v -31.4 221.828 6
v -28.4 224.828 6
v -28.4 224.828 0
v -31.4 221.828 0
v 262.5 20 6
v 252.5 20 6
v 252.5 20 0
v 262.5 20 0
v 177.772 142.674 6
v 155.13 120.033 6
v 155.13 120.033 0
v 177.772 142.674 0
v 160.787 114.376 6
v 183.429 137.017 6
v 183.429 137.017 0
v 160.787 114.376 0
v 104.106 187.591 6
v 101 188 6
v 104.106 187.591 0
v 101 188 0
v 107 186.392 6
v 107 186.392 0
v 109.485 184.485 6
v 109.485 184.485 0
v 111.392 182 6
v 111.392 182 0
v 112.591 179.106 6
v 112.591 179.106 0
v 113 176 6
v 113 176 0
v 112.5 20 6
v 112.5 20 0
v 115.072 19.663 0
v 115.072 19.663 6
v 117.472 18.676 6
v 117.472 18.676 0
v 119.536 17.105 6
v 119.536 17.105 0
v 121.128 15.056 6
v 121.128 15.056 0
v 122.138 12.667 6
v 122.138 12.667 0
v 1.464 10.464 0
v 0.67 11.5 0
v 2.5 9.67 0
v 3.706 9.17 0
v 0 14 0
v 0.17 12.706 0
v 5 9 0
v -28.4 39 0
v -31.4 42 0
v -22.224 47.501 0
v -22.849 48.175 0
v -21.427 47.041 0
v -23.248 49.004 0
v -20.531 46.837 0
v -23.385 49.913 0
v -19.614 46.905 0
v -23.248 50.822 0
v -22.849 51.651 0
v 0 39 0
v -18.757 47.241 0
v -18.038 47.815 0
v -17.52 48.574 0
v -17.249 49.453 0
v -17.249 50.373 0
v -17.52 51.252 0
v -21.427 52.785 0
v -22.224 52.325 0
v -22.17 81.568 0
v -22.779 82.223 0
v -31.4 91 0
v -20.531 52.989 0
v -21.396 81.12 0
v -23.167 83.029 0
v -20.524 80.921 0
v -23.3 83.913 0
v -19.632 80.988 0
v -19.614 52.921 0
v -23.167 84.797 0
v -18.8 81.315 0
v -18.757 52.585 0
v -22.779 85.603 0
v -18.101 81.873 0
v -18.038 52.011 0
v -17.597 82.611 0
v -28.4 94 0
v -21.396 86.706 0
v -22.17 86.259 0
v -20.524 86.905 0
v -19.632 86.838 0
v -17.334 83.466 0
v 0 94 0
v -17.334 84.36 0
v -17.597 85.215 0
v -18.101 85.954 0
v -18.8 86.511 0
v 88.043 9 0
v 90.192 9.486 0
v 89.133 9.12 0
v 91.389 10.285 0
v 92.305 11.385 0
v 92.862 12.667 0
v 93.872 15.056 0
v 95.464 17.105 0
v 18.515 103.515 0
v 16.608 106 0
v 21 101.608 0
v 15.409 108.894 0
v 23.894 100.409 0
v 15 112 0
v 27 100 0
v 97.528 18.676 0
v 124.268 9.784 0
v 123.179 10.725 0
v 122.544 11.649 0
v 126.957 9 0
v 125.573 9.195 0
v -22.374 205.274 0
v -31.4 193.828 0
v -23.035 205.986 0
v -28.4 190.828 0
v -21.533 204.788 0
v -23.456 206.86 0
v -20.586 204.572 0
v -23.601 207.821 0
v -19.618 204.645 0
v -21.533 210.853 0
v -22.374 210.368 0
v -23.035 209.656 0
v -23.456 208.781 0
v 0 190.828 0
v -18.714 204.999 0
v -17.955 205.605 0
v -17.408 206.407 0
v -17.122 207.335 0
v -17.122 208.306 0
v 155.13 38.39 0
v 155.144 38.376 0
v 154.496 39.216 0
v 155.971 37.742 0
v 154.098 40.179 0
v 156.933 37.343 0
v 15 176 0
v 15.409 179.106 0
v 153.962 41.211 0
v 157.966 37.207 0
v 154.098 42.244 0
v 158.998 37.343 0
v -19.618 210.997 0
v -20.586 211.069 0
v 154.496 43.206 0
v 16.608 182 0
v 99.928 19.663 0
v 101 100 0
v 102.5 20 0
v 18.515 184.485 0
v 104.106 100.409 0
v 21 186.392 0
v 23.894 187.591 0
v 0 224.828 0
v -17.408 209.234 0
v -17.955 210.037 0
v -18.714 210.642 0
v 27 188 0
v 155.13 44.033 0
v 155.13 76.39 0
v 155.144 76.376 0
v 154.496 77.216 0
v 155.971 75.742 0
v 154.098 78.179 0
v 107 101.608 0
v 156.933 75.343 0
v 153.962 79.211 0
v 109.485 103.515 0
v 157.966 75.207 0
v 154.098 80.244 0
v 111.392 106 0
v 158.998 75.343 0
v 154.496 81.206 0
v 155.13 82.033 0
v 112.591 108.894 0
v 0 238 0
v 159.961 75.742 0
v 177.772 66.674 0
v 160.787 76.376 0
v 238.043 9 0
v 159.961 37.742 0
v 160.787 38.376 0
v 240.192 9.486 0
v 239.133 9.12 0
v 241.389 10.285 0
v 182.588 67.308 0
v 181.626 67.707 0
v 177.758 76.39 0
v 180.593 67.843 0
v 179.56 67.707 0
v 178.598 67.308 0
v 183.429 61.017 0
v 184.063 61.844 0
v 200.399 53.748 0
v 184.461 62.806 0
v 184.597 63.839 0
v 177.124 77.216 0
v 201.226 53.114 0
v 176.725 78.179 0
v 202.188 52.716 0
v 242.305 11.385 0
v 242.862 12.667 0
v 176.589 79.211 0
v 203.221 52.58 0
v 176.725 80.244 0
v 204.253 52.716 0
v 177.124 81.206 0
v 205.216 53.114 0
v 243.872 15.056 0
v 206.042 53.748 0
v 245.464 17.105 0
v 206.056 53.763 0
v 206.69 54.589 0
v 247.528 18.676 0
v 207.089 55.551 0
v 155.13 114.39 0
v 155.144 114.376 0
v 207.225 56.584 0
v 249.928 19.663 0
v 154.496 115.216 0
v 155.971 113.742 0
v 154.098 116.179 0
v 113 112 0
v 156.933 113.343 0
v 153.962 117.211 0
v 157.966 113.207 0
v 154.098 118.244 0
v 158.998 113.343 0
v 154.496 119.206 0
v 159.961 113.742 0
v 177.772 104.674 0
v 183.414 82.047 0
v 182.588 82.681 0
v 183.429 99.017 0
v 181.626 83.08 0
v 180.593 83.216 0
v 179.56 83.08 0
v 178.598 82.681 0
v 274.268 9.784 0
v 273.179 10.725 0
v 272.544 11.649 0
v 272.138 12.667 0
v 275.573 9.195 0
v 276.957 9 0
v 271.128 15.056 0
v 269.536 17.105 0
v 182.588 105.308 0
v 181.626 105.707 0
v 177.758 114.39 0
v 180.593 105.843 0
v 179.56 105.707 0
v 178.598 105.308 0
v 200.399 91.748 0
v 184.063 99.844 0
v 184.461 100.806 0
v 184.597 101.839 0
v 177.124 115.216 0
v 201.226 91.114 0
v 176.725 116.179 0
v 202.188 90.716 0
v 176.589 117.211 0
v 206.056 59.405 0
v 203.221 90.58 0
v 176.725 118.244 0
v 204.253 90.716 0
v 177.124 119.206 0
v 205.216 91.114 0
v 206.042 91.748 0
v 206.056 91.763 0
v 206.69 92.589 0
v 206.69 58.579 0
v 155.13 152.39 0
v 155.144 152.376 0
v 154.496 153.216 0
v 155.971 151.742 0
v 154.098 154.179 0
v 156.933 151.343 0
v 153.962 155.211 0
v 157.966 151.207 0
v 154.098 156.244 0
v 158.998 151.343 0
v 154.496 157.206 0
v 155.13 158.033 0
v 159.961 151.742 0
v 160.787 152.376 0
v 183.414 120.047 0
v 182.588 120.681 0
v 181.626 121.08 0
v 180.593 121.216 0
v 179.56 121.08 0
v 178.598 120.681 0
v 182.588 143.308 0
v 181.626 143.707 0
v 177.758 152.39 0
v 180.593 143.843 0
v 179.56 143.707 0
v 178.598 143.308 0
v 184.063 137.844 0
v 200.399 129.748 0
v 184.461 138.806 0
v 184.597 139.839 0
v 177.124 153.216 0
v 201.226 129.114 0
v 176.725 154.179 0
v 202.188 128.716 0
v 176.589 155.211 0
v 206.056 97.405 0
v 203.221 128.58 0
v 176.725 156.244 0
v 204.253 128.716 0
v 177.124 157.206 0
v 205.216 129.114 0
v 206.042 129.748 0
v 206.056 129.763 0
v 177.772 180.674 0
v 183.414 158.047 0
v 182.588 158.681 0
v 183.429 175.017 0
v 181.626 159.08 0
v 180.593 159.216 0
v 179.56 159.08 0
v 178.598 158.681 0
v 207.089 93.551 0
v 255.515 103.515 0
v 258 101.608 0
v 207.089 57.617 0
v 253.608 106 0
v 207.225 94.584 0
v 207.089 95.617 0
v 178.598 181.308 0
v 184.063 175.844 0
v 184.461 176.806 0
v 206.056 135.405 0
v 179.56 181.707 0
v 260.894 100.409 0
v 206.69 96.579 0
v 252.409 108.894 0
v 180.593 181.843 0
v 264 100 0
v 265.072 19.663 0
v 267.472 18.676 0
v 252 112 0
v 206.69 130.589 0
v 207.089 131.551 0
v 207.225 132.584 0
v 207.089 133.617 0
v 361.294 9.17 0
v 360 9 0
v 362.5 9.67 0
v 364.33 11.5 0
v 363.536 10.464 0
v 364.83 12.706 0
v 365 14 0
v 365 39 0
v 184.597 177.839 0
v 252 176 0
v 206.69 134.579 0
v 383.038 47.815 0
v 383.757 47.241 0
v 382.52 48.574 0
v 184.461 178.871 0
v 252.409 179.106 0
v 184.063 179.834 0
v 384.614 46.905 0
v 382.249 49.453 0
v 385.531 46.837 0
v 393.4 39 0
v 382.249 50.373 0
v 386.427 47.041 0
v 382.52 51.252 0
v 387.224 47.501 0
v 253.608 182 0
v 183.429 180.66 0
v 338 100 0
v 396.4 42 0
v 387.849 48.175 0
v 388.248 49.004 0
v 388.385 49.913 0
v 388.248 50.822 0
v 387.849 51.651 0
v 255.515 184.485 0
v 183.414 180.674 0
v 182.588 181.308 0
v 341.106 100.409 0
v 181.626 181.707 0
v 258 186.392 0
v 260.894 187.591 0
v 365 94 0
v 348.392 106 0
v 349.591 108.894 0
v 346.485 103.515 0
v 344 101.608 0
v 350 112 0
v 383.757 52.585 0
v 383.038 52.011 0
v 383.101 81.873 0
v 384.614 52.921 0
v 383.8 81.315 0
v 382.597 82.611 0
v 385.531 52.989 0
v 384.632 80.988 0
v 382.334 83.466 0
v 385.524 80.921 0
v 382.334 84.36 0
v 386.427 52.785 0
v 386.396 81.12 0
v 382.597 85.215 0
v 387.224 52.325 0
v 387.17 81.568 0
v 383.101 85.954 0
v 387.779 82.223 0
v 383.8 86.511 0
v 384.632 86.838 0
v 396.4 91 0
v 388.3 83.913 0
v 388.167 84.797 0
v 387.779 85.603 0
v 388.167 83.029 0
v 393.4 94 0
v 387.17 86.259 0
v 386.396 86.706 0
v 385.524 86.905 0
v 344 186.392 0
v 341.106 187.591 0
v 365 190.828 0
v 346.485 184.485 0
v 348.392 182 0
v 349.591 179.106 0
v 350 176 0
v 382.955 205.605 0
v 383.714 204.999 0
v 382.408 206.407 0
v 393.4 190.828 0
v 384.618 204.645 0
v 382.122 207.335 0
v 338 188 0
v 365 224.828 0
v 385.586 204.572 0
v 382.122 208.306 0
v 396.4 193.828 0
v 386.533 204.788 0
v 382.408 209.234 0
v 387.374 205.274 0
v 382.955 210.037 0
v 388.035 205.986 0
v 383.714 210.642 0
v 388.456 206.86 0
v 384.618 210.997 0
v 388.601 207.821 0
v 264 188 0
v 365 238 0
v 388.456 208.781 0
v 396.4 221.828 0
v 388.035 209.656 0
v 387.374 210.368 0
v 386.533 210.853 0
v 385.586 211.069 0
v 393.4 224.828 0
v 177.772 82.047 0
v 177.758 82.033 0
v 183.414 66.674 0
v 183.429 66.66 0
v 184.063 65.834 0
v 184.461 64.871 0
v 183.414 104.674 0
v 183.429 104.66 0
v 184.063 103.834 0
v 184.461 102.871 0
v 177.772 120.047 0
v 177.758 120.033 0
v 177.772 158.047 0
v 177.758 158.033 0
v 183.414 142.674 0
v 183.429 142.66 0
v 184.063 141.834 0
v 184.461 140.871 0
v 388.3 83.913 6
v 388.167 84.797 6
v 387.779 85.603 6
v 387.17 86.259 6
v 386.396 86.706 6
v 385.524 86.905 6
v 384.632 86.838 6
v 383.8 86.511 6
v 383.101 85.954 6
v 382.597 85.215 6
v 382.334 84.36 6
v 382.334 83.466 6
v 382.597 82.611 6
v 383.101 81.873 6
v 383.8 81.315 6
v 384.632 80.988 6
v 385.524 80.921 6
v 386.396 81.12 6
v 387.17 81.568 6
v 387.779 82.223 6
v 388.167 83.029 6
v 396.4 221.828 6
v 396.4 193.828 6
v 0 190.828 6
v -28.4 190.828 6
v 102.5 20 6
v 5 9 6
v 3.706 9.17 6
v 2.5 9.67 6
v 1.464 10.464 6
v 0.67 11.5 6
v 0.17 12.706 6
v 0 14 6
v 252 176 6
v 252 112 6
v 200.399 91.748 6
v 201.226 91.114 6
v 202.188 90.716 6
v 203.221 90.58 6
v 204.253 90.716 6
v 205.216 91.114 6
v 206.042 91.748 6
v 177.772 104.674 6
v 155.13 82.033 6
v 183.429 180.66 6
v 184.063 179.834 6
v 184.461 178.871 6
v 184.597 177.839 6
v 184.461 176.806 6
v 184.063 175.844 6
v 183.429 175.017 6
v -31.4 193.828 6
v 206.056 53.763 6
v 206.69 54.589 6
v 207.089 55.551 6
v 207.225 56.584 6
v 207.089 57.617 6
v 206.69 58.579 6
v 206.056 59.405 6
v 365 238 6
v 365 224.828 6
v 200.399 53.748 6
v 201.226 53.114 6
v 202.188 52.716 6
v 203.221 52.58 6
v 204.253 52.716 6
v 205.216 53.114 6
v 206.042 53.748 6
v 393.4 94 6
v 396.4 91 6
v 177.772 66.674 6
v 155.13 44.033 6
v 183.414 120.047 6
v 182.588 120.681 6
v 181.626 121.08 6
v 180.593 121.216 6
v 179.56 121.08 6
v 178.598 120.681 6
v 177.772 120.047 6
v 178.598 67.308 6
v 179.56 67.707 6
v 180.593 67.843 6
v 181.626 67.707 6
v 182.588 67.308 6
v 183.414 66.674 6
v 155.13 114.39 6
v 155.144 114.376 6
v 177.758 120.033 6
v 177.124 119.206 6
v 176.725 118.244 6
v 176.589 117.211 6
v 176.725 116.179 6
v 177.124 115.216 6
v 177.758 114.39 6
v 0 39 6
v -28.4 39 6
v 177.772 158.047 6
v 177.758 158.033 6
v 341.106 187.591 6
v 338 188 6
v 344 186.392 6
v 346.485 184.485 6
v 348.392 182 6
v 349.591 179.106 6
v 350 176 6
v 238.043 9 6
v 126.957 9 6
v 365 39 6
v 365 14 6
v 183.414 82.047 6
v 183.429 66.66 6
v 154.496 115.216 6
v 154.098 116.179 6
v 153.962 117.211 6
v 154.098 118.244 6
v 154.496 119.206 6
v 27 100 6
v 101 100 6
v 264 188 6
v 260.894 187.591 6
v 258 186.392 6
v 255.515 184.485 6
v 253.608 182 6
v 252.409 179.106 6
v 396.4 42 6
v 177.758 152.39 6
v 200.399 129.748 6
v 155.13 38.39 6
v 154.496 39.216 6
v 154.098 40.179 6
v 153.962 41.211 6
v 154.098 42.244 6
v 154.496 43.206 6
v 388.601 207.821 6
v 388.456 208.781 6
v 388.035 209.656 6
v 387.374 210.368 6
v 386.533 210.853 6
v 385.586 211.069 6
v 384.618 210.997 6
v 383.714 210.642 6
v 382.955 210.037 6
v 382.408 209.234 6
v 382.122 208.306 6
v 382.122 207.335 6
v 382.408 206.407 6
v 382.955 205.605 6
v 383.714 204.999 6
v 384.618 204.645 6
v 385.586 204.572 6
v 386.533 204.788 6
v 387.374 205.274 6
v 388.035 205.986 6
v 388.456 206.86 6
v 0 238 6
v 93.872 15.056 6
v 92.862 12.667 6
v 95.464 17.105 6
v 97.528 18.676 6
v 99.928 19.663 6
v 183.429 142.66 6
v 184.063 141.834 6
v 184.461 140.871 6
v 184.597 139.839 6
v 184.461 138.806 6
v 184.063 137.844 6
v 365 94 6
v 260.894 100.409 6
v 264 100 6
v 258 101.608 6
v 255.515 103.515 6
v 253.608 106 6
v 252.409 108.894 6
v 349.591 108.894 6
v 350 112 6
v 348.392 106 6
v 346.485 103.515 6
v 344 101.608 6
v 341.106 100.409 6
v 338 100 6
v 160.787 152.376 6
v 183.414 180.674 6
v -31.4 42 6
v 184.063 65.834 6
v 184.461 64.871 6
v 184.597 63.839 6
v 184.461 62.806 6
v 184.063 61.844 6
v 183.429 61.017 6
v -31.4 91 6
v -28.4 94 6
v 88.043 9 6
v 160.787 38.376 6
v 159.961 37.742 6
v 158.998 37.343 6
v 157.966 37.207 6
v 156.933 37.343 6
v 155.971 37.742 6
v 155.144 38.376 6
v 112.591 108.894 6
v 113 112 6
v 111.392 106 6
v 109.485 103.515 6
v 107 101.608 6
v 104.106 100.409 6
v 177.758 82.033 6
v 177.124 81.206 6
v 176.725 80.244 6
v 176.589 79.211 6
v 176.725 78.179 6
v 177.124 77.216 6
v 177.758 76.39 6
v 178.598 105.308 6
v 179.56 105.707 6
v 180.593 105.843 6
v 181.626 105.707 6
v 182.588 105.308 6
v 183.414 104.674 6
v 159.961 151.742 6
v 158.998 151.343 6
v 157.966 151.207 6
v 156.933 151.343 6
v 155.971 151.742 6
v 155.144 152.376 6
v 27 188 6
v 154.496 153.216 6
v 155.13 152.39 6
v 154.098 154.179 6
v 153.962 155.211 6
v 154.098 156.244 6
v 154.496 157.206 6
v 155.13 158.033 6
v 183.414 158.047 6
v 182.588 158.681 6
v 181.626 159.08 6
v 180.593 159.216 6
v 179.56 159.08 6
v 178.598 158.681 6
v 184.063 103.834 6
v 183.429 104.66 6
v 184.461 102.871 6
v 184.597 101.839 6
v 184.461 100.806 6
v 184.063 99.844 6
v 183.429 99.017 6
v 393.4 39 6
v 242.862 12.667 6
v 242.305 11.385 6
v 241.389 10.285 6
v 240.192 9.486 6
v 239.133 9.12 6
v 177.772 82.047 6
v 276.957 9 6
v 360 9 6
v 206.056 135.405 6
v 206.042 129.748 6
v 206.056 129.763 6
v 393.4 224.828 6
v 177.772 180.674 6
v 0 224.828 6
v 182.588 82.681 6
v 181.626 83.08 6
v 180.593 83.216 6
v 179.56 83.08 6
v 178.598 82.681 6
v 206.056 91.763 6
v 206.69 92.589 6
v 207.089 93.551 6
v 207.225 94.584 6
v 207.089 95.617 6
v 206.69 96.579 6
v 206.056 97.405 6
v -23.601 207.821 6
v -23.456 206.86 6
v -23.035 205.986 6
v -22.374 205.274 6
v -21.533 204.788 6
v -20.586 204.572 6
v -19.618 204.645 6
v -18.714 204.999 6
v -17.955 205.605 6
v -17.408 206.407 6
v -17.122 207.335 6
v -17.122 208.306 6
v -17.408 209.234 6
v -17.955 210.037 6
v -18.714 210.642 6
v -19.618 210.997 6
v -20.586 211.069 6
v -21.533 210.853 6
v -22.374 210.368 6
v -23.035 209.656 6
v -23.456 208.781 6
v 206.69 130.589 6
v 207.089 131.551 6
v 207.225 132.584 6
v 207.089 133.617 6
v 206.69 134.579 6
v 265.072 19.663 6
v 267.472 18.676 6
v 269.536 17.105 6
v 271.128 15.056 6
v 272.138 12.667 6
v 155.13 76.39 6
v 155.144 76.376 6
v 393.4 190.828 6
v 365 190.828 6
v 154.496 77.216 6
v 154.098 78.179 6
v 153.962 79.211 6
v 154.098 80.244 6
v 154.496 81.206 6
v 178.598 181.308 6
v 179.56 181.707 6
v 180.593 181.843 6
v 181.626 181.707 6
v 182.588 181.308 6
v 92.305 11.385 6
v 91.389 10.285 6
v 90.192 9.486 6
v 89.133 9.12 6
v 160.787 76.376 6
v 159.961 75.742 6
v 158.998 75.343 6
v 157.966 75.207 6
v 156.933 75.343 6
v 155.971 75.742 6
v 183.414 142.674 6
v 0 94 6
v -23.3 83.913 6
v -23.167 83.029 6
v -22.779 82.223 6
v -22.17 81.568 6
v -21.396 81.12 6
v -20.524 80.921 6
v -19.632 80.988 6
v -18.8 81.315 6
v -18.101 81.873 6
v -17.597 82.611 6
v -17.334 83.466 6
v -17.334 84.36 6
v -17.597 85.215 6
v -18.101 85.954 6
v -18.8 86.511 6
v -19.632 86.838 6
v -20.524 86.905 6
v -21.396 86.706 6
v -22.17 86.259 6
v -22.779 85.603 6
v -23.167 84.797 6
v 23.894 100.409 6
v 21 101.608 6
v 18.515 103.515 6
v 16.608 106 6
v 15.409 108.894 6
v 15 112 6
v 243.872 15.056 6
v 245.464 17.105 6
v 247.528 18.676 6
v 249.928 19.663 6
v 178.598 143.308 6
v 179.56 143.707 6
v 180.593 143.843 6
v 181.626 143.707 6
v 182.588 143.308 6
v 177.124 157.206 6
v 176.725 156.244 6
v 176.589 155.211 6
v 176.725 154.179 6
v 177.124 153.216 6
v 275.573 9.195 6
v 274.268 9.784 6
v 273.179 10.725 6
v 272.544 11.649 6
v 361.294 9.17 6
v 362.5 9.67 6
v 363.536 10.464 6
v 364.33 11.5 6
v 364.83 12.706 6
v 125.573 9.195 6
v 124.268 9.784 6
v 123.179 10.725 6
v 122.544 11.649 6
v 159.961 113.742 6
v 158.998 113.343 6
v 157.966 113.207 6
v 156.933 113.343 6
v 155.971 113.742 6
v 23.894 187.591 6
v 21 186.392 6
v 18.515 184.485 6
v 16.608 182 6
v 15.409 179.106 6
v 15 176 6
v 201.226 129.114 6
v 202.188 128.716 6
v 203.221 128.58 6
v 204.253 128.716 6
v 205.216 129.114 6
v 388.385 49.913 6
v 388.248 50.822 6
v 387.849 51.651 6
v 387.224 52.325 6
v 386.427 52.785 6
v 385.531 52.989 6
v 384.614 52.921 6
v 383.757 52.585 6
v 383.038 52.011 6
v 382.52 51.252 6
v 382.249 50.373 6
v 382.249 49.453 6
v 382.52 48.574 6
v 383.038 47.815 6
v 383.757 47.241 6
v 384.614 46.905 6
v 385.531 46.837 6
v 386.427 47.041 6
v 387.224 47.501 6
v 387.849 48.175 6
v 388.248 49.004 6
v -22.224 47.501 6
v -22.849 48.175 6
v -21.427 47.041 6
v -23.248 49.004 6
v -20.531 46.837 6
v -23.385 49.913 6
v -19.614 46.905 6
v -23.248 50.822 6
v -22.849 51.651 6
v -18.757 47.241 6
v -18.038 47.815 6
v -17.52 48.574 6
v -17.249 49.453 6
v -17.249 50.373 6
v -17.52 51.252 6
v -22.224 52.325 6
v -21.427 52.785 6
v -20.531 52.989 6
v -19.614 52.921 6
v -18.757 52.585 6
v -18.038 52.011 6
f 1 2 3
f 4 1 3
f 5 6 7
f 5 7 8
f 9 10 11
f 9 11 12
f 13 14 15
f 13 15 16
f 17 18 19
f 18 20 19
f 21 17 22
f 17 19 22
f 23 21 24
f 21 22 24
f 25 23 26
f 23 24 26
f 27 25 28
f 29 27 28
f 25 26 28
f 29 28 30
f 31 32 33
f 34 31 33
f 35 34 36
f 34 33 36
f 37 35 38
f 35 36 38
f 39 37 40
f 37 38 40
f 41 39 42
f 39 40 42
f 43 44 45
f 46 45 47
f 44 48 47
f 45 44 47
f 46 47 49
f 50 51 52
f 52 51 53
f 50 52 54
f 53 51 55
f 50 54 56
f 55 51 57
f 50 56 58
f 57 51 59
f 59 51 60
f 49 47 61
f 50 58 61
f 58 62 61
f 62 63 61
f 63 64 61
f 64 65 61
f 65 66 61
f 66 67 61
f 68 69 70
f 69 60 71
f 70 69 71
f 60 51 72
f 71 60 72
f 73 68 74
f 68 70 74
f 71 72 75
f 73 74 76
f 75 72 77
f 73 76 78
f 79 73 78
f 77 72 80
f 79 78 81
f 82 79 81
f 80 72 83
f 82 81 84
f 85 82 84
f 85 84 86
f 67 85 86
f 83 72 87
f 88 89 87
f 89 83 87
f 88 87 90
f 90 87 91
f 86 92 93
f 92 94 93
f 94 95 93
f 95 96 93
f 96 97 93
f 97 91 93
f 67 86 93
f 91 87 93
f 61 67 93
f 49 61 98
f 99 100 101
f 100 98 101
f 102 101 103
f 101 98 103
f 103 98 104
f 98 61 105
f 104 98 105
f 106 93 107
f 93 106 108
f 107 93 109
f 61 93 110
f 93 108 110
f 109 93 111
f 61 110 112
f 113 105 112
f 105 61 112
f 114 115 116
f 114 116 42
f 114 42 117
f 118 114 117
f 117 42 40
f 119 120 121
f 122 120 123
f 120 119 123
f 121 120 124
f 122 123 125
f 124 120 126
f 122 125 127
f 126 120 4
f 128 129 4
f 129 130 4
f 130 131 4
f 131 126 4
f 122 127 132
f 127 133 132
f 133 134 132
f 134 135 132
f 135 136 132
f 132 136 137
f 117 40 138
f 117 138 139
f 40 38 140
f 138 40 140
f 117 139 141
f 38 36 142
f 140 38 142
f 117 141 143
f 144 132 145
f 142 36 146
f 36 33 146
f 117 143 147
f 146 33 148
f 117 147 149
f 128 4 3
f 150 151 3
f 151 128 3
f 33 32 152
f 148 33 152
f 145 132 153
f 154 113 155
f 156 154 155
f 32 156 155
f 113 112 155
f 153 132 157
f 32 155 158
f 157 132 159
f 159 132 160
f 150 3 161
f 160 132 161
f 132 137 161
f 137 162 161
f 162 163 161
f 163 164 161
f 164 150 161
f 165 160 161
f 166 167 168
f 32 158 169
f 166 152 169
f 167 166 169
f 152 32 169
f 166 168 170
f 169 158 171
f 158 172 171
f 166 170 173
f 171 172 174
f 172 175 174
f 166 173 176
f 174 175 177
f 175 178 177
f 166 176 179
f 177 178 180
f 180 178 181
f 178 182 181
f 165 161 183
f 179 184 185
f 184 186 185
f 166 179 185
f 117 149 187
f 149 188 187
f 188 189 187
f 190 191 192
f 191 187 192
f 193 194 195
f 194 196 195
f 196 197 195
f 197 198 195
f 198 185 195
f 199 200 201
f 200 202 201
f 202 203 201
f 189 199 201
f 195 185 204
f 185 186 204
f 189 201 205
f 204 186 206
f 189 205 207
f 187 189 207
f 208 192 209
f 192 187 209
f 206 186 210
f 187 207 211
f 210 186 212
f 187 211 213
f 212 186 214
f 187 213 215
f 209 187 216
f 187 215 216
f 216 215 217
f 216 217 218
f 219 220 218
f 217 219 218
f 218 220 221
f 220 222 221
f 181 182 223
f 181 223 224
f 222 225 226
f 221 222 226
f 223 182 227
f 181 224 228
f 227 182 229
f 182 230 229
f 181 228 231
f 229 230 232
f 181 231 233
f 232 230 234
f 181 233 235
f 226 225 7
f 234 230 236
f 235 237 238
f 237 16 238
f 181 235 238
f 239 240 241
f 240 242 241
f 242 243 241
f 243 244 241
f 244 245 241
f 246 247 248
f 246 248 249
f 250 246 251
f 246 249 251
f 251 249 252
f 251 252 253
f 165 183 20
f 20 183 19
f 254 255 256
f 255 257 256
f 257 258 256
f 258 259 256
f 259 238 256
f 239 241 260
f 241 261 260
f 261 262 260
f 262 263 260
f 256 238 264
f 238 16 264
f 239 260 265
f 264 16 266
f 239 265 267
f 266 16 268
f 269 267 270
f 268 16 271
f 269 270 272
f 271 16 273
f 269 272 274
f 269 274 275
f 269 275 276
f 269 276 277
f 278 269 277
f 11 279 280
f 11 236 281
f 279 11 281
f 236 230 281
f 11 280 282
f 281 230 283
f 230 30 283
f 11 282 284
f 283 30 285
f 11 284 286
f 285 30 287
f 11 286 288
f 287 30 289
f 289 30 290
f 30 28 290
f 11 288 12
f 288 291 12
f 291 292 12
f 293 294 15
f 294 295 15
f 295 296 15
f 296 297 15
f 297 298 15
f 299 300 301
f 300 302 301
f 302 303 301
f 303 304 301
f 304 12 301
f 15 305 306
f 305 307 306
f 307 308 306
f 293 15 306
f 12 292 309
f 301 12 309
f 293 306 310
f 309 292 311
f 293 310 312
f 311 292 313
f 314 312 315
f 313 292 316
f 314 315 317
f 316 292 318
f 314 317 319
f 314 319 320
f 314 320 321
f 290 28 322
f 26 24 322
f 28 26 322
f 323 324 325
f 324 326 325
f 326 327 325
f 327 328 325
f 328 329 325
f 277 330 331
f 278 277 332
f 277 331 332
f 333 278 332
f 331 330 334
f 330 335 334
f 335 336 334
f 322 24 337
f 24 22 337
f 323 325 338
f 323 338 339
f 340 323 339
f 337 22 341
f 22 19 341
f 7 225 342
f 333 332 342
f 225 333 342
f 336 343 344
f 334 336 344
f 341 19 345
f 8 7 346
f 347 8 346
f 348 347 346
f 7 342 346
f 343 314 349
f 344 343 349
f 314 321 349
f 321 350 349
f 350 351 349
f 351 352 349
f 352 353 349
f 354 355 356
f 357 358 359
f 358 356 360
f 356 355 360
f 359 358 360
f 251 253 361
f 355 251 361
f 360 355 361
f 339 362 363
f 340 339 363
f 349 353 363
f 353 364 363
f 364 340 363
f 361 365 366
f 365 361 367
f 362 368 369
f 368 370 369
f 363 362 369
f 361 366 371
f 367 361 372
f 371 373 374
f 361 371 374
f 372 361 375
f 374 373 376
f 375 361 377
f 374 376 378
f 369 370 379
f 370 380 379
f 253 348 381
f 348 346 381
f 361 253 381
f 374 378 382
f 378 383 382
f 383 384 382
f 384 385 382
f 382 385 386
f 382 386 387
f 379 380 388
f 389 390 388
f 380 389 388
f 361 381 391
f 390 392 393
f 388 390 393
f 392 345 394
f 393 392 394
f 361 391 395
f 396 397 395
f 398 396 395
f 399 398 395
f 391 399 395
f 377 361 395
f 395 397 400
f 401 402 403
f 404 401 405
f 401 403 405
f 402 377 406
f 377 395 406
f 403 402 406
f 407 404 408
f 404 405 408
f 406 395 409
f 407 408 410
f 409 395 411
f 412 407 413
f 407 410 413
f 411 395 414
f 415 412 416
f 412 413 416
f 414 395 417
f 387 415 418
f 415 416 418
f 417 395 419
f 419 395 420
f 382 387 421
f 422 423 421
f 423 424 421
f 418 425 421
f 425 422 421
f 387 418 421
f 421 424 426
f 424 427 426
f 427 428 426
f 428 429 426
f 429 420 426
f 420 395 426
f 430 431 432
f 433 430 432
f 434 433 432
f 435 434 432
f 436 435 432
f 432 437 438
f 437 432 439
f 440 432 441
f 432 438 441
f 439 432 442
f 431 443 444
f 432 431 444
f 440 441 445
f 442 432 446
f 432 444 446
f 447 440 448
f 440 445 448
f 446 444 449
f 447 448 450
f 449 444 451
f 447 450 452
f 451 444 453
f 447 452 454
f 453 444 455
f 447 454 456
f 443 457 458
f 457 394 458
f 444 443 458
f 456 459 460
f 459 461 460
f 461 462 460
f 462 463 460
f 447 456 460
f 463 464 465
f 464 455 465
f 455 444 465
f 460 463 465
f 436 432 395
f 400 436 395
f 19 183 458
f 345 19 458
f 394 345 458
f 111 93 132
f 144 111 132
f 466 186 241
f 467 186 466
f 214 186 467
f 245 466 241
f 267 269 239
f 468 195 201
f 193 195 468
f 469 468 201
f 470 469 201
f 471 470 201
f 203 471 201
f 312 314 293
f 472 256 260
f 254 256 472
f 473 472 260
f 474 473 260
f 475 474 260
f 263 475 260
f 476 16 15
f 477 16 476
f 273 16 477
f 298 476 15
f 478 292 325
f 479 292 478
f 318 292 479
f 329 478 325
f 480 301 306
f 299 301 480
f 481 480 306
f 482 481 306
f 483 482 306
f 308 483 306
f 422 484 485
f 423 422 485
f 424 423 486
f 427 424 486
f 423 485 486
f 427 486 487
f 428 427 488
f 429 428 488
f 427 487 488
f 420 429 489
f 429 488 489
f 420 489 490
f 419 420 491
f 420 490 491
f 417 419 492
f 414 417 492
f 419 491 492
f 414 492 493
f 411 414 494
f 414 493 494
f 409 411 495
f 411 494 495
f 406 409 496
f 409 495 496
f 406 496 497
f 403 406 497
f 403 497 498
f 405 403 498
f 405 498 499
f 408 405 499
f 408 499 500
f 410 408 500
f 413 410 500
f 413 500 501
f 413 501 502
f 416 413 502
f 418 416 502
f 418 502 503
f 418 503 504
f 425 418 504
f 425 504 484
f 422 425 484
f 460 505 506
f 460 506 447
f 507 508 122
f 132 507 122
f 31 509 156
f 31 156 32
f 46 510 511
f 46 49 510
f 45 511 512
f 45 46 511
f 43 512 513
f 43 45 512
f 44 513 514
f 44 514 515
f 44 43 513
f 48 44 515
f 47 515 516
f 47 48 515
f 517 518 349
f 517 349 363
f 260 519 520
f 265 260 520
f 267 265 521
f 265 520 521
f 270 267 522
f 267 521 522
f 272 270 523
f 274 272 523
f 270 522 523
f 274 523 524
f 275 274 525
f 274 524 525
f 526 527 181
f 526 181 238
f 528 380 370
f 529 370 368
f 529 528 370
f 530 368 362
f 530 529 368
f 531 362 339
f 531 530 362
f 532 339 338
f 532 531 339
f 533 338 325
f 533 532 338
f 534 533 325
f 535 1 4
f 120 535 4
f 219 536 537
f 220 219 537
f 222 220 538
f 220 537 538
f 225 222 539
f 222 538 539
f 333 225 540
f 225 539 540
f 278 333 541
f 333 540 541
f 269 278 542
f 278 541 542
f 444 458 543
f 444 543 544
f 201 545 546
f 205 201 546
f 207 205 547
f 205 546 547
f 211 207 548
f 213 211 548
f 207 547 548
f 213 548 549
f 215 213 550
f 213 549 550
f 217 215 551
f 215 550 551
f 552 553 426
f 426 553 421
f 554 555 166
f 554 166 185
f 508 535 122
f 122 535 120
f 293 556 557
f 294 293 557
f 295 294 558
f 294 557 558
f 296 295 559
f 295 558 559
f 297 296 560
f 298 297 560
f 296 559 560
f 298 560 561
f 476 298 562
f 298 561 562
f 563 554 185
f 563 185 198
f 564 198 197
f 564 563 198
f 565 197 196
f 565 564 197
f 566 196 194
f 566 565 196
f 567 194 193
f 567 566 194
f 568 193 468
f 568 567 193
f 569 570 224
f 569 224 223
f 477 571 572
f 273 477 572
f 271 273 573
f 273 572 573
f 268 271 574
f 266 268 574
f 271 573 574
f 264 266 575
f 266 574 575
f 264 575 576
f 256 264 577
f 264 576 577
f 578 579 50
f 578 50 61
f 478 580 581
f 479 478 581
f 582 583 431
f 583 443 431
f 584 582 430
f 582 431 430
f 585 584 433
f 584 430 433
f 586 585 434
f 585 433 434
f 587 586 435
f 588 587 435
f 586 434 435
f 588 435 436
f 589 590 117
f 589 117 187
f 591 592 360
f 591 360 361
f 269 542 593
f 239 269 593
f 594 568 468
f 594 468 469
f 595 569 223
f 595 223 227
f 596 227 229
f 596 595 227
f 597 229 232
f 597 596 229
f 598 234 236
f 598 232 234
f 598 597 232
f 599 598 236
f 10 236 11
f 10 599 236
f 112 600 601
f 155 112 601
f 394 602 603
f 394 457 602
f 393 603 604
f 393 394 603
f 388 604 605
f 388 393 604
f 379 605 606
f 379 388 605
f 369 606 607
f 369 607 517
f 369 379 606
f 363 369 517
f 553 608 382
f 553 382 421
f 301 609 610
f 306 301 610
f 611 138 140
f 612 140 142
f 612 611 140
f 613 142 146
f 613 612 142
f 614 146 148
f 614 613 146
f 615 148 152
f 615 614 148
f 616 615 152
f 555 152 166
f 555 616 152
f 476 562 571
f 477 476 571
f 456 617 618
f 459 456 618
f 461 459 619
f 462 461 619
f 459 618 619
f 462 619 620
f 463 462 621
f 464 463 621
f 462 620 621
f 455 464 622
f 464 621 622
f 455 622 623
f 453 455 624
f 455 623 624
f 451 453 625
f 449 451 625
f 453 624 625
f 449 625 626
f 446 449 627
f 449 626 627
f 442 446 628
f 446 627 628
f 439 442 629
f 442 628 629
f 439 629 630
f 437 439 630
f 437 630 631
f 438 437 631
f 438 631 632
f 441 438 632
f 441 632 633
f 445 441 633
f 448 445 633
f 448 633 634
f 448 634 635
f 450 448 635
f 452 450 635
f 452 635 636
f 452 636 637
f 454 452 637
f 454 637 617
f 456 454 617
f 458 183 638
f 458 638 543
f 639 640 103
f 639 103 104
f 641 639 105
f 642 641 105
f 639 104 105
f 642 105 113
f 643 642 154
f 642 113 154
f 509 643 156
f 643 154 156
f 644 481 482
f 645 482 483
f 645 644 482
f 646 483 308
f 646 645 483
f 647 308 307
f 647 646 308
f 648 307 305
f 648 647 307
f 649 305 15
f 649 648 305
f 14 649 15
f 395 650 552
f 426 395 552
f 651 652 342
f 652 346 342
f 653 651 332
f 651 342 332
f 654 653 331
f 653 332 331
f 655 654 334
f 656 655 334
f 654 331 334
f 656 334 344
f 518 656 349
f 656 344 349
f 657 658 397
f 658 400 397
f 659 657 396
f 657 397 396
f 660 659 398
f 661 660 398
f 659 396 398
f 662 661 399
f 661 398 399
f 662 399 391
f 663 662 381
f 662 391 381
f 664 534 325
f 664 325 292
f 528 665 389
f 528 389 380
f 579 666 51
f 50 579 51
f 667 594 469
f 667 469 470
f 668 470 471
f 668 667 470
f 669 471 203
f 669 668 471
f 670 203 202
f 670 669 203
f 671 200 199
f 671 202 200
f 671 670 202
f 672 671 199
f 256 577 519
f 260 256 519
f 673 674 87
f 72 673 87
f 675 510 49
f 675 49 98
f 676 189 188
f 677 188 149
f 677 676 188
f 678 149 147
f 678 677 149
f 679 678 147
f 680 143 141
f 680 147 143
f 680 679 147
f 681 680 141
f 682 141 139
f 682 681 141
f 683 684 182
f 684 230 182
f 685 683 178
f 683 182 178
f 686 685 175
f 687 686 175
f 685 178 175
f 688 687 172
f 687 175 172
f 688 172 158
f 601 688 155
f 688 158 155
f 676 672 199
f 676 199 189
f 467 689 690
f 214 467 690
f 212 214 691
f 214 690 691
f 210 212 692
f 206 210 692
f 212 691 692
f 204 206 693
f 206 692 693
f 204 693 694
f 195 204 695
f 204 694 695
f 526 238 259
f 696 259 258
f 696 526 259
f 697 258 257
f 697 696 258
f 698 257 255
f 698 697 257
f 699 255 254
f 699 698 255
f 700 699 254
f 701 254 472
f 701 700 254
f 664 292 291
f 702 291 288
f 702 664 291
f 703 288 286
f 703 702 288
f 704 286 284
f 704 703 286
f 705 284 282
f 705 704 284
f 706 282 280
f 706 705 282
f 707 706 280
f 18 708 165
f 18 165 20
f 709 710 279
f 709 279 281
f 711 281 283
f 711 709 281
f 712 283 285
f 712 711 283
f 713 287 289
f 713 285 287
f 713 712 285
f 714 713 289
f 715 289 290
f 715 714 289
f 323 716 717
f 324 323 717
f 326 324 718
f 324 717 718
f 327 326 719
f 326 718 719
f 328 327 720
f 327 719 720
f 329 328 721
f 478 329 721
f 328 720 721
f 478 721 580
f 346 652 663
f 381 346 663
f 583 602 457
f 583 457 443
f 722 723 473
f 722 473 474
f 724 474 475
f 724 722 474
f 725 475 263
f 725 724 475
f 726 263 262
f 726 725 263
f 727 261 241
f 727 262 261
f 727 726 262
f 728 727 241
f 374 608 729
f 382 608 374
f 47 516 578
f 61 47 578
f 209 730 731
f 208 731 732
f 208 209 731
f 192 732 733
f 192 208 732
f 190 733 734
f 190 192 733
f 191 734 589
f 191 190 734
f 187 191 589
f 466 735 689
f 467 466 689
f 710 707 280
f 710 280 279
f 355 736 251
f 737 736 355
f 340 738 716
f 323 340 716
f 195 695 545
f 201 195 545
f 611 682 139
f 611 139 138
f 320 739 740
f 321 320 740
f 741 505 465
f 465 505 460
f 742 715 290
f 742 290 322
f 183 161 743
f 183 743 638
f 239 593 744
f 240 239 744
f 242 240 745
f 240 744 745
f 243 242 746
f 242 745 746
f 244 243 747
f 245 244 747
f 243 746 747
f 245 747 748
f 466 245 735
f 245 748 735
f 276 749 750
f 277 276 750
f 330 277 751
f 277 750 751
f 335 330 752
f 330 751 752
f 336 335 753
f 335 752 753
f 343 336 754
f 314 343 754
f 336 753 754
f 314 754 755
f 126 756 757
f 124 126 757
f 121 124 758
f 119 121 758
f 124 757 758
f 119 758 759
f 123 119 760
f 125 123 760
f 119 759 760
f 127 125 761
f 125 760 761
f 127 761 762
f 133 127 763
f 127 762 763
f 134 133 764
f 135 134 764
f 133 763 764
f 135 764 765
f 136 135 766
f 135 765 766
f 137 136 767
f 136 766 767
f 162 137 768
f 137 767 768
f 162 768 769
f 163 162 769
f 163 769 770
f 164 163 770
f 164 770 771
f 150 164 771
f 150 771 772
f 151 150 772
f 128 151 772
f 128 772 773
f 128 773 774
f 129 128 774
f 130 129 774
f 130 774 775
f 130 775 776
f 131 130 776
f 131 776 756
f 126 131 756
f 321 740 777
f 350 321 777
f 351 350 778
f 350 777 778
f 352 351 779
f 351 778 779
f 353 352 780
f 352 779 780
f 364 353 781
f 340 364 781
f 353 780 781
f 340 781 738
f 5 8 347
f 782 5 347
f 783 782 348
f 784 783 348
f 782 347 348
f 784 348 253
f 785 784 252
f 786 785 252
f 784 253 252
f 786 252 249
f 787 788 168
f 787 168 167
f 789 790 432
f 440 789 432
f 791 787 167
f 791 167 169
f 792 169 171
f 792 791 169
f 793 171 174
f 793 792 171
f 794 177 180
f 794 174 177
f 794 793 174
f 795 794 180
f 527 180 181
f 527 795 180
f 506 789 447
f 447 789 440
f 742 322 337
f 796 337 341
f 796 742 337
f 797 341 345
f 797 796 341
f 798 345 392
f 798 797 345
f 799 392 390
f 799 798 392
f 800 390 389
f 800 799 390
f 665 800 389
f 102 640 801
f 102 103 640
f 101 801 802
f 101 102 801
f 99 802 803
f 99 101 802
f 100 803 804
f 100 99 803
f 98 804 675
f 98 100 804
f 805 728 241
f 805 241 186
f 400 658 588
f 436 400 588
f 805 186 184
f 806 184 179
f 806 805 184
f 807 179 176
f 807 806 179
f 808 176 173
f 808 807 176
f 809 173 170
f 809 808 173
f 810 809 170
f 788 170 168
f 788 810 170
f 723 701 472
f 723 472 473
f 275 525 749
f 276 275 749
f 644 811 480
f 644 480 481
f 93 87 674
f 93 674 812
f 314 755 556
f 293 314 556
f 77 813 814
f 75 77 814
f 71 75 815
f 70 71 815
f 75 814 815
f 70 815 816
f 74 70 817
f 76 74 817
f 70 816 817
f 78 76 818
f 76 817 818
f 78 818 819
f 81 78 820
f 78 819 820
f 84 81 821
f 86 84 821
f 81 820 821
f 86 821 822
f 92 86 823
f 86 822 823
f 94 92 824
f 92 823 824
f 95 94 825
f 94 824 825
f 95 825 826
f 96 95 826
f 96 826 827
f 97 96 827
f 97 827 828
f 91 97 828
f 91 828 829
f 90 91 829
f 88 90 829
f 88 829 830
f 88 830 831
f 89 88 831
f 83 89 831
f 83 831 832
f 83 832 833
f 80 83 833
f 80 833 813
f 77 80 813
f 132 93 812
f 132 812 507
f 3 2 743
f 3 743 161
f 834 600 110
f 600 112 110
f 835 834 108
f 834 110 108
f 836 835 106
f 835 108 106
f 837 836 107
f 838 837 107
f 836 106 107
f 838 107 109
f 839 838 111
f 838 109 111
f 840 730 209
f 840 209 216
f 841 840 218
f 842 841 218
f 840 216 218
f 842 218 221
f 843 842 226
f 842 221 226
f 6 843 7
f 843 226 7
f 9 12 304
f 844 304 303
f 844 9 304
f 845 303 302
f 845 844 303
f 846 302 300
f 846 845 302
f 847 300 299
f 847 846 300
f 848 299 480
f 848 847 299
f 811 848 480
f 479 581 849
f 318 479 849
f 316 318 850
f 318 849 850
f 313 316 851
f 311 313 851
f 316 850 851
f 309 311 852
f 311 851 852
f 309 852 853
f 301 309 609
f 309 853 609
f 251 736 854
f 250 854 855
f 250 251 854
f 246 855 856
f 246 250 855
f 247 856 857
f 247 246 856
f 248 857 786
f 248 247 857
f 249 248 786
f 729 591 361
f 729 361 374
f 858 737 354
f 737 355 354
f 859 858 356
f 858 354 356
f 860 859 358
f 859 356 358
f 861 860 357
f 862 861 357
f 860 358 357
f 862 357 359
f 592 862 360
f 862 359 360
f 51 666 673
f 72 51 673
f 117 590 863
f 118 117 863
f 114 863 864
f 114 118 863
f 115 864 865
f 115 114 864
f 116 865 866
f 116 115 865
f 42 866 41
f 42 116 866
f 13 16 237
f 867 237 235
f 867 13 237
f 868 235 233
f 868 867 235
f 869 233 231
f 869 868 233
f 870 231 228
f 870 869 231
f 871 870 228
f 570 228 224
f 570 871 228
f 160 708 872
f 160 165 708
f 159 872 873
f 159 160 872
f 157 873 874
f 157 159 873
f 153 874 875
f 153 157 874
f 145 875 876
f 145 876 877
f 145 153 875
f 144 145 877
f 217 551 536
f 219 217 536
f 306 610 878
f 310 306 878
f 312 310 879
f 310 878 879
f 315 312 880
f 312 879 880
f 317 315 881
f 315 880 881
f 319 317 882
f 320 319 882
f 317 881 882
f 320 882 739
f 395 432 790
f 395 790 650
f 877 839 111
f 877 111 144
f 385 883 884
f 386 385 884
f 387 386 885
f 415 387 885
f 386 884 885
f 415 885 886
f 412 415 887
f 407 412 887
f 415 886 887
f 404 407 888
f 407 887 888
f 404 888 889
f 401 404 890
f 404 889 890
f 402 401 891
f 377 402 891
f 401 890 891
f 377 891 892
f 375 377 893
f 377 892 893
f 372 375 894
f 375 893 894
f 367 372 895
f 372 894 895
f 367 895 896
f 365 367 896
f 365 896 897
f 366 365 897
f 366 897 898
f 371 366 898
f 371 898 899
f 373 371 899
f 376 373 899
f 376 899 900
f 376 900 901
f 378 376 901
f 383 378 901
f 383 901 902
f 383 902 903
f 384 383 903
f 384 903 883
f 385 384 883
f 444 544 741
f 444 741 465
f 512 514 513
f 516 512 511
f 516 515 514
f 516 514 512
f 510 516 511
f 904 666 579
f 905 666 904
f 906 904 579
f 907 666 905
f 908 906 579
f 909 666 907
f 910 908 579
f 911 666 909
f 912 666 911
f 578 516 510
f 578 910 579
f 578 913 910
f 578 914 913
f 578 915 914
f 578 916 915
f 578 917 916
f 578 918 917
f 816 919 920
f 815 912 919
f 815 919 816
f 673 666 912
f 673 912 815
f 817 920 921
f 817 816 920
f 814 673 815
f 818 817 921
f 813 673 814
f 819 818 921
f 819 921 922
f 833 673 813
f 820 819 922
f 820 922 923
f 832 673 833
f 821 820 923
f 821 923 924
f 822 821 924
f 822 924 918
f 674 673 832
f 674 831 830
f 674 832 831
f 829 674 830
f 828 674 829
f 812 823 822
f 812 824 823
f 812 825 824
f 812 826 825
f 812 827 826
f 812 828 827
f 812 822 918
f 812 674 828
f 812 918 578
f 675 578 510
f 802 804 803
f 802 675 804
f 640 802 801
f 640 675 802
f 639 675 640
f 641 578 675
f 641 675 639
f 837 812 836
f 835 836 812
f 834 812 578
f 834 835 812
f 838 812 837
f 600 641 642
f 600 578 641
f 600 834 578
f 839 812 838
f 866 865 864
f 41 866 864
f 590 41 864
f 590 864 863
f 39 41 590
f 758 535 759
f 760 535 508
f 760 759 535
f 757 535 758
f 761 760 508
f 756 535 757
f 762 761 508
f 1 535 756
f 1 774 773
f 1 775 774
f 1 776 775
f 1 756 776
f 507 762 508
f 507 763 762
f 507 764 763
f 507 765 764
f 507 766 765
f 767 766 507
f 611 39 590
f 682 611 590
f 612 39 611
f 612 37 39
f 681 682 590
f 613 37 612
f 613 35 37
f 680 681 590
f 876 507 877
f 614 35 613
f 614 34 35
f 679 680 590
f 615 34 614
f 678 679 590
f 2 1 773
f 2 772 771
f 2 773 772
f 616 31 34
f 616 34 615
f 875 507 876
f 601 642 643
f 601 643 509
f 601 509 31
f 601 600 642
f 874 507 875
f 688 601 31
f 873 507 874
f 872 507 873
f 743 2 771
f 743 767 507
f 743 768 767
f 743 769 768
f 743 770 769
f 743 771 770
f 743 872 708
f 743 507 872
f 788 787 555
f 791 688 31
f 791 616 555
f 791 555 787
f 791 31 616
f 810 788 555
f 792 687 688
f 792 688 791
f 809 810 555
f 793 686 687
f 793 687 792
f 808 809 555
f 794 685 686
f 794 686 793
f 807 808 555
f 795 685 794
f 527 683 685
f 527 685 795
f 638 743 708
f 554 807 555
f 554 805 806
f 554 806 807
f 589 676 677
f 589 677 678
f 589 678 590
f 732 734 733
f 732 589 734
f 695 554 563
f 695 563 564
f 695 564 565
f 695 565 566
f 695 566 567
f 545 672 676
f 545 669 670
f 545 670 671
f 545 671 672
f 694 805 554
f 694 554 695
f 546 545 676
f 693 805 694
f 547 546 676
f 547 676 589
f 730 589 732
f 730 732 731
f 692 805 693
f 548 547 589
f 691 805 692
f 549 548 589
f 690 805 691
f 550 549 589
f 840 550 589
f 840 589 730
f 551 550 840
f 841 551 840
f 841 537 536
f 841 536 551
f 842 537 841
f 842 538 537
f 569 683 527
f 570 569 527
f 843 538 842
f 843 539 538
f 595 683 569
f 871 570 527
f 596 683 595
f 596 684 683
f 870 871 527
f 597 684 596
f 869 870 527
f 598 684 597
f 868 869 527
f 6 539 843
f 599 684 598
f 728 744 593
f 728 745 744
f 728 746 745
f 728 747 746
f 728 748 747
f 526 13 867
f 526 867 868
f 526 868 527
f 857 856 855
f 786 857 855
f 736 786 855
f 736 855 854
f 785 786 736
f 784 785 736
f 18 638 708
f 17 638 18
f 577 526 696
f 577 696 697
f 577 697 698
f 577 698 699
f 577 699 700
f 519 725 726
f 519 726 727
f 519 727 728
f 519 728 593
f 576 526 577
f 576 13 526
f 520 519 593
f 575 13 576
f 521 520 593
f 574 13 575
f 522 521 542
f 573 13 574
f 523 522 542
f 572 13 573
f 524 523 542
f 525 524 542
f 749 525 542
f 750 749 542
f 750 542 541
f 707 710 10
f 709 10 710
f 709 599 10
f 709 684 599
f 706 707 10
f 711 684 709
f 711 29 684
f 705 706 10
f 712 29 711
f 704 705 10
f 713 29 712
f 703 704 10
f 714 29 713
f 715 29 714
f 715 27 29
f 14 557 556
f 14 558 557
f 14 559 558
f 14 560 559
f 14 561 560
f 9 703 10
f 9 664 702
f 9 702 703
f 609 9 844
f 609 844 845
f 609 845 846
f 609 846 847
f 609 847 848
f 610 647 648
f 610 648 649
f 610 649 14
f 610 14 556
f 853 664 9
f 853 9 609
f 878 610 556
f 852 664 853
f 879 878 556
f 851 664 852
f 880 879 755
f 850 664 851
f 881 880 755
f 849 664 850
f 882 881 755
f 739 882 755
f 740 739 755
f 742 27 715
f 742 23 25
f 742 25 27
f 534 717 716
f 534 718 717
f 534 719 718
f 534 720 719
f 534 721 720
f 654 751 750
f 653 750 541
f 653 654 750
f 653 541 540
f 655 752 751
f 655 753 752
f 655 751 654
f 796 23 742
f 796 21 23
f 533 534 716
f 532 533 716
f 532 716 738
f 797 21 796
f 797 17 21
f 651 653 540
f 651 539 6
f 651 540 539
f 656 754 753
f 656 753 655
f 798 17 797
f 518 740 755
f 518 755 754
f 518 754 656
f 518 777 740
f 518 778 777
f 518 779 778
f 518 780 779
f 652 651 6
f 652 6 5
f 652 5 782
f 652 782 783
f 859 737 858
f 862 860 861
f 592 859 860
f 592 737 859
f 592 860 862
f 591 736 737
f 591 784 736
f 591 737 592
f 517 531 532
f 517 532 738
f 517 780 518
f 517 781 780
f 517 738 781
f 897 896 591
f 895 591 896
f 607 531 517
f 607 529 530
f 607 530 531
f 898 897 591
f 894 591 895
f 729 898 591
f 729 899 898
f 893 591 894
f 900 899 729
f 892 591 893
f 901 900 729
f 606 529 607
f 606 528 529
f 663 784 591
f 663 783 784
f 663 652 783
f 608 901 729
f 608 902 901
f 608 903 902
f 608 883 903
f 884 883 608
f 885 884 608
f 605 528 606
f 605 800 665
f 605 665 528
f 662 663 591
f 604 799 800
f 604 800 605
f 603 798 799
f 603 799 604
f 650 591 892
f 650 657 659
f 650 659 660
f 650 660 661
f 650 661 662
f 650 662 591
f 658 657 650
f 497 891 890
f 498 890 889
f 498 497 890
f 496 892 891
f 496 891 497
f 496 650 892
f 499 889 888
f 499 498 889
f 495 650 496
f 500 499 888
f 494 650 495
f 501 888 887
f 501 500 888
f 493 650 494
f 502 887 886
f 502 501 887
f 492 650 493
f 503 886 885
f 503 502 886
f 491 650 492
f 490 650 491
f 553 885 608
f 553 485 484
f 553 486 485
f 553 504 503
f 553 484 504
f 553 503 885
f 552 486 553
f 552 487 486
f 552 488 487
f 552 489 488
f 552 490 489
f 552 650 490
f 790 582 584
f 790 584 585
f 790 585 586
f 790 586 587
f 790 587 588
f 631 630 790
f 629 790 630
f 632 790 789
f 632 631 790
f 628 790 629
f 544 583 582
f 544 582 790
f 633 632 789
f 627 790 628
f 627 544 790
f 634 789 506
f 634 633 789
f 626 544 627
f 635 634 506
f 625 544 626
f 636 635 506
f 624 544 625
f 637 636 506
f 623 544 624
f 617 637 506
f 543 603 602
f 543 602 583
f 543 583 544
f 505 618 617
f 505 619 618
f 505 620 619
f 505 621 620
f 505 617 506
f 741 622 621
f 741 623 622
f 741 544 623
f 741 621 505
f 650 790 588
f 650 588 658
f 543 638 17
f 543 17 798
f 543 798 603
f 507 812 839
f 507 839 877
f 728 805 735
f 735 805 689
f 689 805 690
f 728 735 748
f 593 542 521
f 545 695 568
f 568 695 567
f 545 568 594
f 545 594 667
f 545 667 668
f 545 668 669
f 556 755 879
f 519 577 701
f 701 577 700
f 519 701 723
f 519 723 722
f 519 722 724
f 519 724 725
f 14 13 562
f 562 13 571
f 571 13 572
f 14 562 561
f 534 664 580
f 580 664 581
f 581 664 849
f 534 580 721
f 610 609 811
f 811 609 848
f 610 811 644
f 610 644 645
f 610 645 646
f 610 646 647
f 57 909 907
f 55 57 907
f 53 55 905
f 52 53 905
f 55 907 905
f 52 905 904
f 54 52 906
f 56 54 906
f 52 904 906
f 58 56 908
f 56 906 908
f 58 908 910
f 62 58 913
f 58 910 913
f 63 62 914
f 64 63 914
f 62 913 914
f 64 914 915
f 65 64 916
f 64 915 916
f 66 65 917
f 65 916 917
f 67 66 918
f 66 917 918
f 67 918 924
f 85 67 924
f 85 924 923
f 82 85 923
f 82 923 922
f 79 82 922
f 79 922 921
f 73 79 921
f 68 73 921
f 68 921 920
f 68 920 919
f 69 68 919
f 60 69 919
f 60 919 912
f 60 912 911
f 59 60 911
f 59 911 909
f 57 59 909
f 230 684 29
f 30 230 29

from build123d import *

# Parameters (mm, degrees)
RESSALTO_EXTRUS_O1_DEPTH = 6
ESBO_O7_W                = 6
ESBO_O7_H                = 39
CORTE_EXTRUS_O5_DEPTH    = 441.818556778
ESBO_O2_W                = 98
ESBO_O2_H                = 88
CORTE_EXTRUS_O1_DEPTH    = 10
FILETE2_R                = 12
CORTE_EXTRUS_O3_DEPTH    = 441.818556778
ESBO_O6_W                = 30
ESBO_O6_H                = 20
CORTE_EXTRUS_O4_DEPTH    = 441.818556778
FILETE3_START            = -1
FILETE3_DEPTH            = 8
FILETE3_2_DEPTH          = 6
ESBO_O8_W                = 6
ESBO_O8_H                = 34
RESSALTO_EXTRUS_O2_DEPTH = 31.4
ESBO_O9_W                = 25.4
ESBO_O9_H                = 55
RESSALTO_EXTRUS_O3_DEPTH = 6
CHANFRO1_SIZE            = 3
ESBO_O10_R               = 3.257801974
ESBO_O10_R_2             = 3
ESBO_O10_R_3             = 3.08509383
CORTE_EXTRUS_O6_DEPTH    = 463.399134947
FILETE4_R                = 5
ESBO_O11_W               = 402.172610053
ESBO_O11_H               = 13.658923547
CORTE_EXTRUS_O7_DEPTH    = 463.399134947
FILETE5_R                = 5


with BuildPart() as part:
    # Esboço1 → Ressalto-extrusão1 (new body)
    with BuildSketch(Plane.XY):
        Polygon((0, 94), (0, 238), (365, 238), (365, 94), (371, 94), (371, 0), (365, 0), (0, 0), (-6, 0), (-6, 94), align=None)
    extrude(amount=RESSALTO_EXTRUS_O1_DEPTH)

    # Esboço7 → Corte-extrusão5 (cut, through all)
    with BuildSketch(Plane.XY.offset(6)):
        with Locations((368, 19.5)):
            Rectangle(ESBO_O7_W, ESBO_O7_H)
        with Locations((-3, 19.5)):
            Rectangle(ESBO_O7_W, ESBO_O7_H)
    extrude(amount=-CORTE_EXTRUS_O5_DEPTH, mode=Mode.SUBTRACT)

    # Esboço2 → Corte-extrusão1 (cut)
    with BuildSketch(Plane.XY.offset(6)):
        with Locations((64, 144)):
            Rectangle(ESBO_O2_W, ESBO_O2_H)
        with Locations((301, 144)):
            Rectangle(ESBO_O2_W, ESBO_O2_H)
    extrude(amount=-CORTE_EXTRUS_O1_DEPTH, mode=Mode.SUBTRACT)

    # Filete2
    filete2_edges = [part.edges().sort_by_distance(p)[0] for p in [
        (15, 100, 3),
        (15, 188, 3),
        (113, 188, 3),
        (113, 100, 3),
        (350, 188, 3),
        (350, 100, 3),
        (252, 100, 3),
        (252, 188, 3),
    ]]
    fillet(filete2_edges, radius=FILETE2_R)

    # Esboço5 → Corte-extrusão3 (cut, through all)
    with BuildSketch(Plane.XY.offset(6)):
        with BuildLine():
            Line((183.428625358, 61.017420231), (160.787066224, 38.375861098))
            ThreePointArc((160.787066224, 38.375861098), (157.965710167, 37.207217155), (155.14435411, 38.375861098))
            Line((155.14435411, 38.375861098), (155.130211974, 38.390003233))
            ThreePointArc((155.130211974, 38.390003233), (153.961568031, 41.21135929), (155.130211974, 44.032715347))
            Line((155.130211974, 44.032715347), (177.771771108, 66.674274481))
            ThreePointArc((177.771771108, 66.674274481), (180.593127165, 67.842918424), (183.414483222, 66.674274481))
            Line((183.414483222, 66.674274481), (183.428625358, 66.660132345))
            ThreePointArc((183.428625358, 66.660132345), (184.597269301, 63.838776288), (183.428625358, 61.017420231))
        make_face()
        with BuildLine():
            Line((177.771771108, 82.046857483), (177.757628972, 82.032715347))
            ThreePointArc((177.757628972, 82.032715347), (176.588985029, 79.21135929), (177.757628972, 76.390003233))
            Line((177.757628972, 76.390003233), (200.399188106, 53.7484441))
            ThreePointArc((200.399188106, 53.7484441), (203.220544163, 52.579800157), (206.04190022, 53.7484441))
            Line((206.04190022, 53.7484441), (206.056042356, 53.762586235))
            ThreePointArc((206.056042356, 53.762586235), (207.224686299, 56.583942292), (206.056042356, 59.405298349))
            Line((206.056042356, 59.405298349), (183.414483222, 82.046857483))
            ThreePointArc((183.414483222, 82.046857483), (180.593127165, 83.215501426), (177.771771108, 82.046857483))
        make_face()
        with BuildLine():
            Line((183.428625358, 99.017420231), (160.787066224, 76.375861098))
            ThreePointArc((160.787066224, 76.375861098), (157.965710167, 75.207217155), (155.14435411, 76.375861098))
            Line((155.14435411, 76.375861098), (155.130211974, 76.390003233))
            ThreePointArc((155.130211974, 76.390003233), (153.961568031, 79.21135929), (155.130211974, 82.032715347))
            Line((155.130211974, 82.032715347), (177.771771108, 104.674274481))
            ThreePointArc((177.771771108, 104.674274481), (180.593127165, 105.842918424), (183.414483222, 104.674274481))
            Line((183.414483222, 104.674274481), (183.428625358, 104.660132345))
            ThreePointArc((183.428625358, 104.660132345), (184.597269301, 101.838776288), (183.428625358, 99.017420231))
        make_face()
        with BuildLine():
            Line((177.771771108, 120.046857483), (177.757628972, 120.032715347))
            ThreePointArc((177.757628972, 120.032715347), (176.588985029, 117.21135929), (177.757628972, 114.390003233))
            Line((177.757628972, 114.390003233), (200.399188106, 91.7484441))
            ThreePointArc((200.399188106, 91.7484441), (203.220544163, 90.579800157), (206.04190022, 91.7484441))
            Line((206.04190022, 91.7484441), (206.056042356, 91.762586235))
            ThreePointArc((206.056042356, 91.762586235), (207.224686299, 94.583942292), (206.056042356, 97.405298349))
            Line((206.056042356, 97.405298349), (183.414483222, 120.046857483))
            ThreePointArc((183.414483222, 120.046857483), (180.593127165, 121.215501426), (177.771771108, 120.046857483))
        make_face()
        with BuildLine():
            Line((183.428625358, 137.017420231), (160.787066224, 114.375861098))
            ThreePointArc((160.787066224, 114.375861098), (157.965710167, 113.207217155), (155.14435411, 114.375861098))
            Line((155.14435411, 114.375861098), (155.130211974, 114.390003233))
            ThreePointArc((155.130211974, 114.390003233), (153.961568031, 117.21135929), (155.130211974, 120.032715347))
            Line((155.130211974, 120.032715347), (177.771771108, 142.674274481))
            ThreePointArc((177.771771108, 142.674274481), (180.593127165, 143.842918424), (183.414483222, 142.674274481))
            Line((183.414483222, 142.674274481), (183.428625358, 142.660132345))
            ThreePointArc((183.428625358, 142.660132345), (184.597269301, 139.838776288), (183.428625358, 137.017420231))
        make_face()
        with BuildLine():
            Line((177.771771108, 158.046857483), (177.757628972, 158.032715347))
            ThreePointArc((177.757628972, 158.032715347), (176.588985029, 155.21135929), (177.757628972, 152.390003233))
            Line((177.757628972, 152.390003233), (200.399188106, 129.7484441))
            ThreePointArc((200.399188106, 129.7484441), (203.220544163, 128.579800157), (206.04190022, 129.7484441))
            Line((206.04190022, 129.7484441), (206.056042356, 129.762586235))
            ThreePointArc((206.056042356, 129.762586235), (207.224686299, 132.583942292), (206.056042356, 135.405298349))
            Line((206.056042356, 135.405298349), (183.414483222, 158.046857483))
            ThreePointArc((183.414483222, 158.046857483), (180.593127165, 159.215501426), (177.771771108, 158.046857483))
        make_face()
        with BuildLine():
            Line((183.428625358, 175.017420231), (160.787066224, 152.375861098))
            ThreePointArc((160.787066224, 152.375861098), (157.965710167, 151.207217155), (155.14435411, 152.375861098))
            Line((155.14435411, 152.375861098), (155.130211974, 152.390003233))
            ThreePointArc((155.130211974, 152.390003233), (153.961568031, 155.21135929), (155.130211974, 158.032715347))
            Line((155.130211974, 158.032715347), (177.771771108, 180.674274481))
            ThreePointArc((177.771771108, 180.674274481), (180.593127165, 181.842918424), (183.414483222, 180.674274481))
            Line((183.414483222, 180.674274481), (183.428625358, 180.660132345))
            ThreePointArc((183.428625358, 180.660132345), (184.597269301, 177.838776288), (183.428625358, 175.017420231))
        make_face()
    extrude(amount=-CORTE_EXTRUS_O3_DEPTH, mode=Mode.SUBTRACT)

    # Esboço6 → Corte-extrusão4 (cut, through all)
    with BuildSketch(Plane.XY.offset(6)):
        with Locations((107.5, 10)):
            Rectangle(ESBO_O6_W, ESBO_O6_H)
        with Locations((257.5, 10)):
            Rectangle(ESBO_O6_W, ESBO_O6_H)
    extrude(amount=-CORTE_EXTRUS_O4_DEPTH, mode=Mode.SUBTRACT)

    # Filete3: read off the stored shape, not the designer's step
    # Filete3 outline → Filete3 (cut)
    with BuildSketch(Plane.XY.offset(FILETE3_START)):
        with BuildLine():
            ThreePointArc((282.5, 0), (275.428932188, 2.928932188), (272.5, 10))
            Line((272.5, 10), (272.5, 0))
            Line((272.5, 0), (282.5, 0))
        make_face()
        with BuildLine():
            Line((92.5, 0), (92.5, 10))
            ThreePointArc((92.5, 10), (89.571067812, 2.928932188), (82.5, 0))
            Line((82.5, 0), (92.5, 0))
        make_face()
        with BuildLine():
            Line((122.5, 0), (132.5, 0))
            ThreePointArc((132.5, 0), (125.428932188, 2.928932188), (122.5, 10))
            Line((122.5, 10), (122.5, 0))
        make_face()
        with BuildLine():
            Line((242.5, 0), (242.5, 10))
            ThreePointArc((242.5, 10), (239.571067812, 2.928932188), (232.5, 0))
            Line((232.5, 0), (242.5, 0))
        make_face()
    extrude(amount=FILETE3_DEPTH, mode=Mode.SUBTRACT)

    # Filete3 2 outline → Filete3 2 (add)
    with BuildSketch(Plane.XY):
        with BuildLine():
            Line((272.5, 20), (262.5, 20))
            ThreePointArc((262.5, 20), (269.571067812, 17.071067812), (272.5, 10))
            Line((272.5, 10), (272.5, 20))
        make_face()
        with BuildLine():
            ThreePointArc((92.5, 10), (95.428932188, 17.071067812), (102.5, 20))
            Line((102.5, 20), (92.5, 20))
            Line((92.5, 20), (92.5, 10))
        make_face()
        with BuildLine():
            ThreePointArc((112.5, 20), (119.571067812, 17.071067812), (122.5, 10))
            Line((122.5, 10), (122.5, 20))
            Line((122.5, 20), (112.5, 20))
        make_face()
        with BuildLine():
            ThreePointArc((242.5, 10), (245.428932188, 17.071067812), (252.5, 20))
            Line((252.5, 20), (242.5, 20))
            Line((242.5, 20), (242.5, 10))
        make_face()
    extrude(amount=FILETE3_2_DEPTH)

    # Esboço8 → Ressalto-extrusão2 (add)
    with BuildSketch(Plane(origin=(365, 0, 0), x_dir=(0, 0, -1), z_dir=(1, 0, 0))):
        with Locations((-3, 207.827931833)):
            Rectangle(ESBO_O8_W, ESBO_O8_H)
    ressalto_extrus_o2 = extrude(amount=RESSALTO_EXTRUS_O2_DEPTH)

    # Espelhar1: Ressalto-extrusão2 across plane
    add(ressalto_extrus_o2.mirror(Plane.ZY.offset(-182.5)))

    # Esboço9 → Ressalto-extrusão3 (add, through all)
    with BuildSketch(Plane.XY.offset(6)):
        with Locations((383.7, 66.5)):
            Rectangle(ESBO_O9_W, ESBO_O9_H)
        with Locations((-18.7, 66.5)):
            Rectangle(ESBO_O9_W, ESBO_O9_H)
    extrude(amount=-RESSALTO_EXTRUS_O3_DEPTH)

    # Chanfro1
    chanfro1_edges = [part.edges().sort_by_distance(p)[0] for p in [
        (396.4, 224.827931833, 3),
        (396.4, 190.827931833, 3),
        (-31.4, 224.827931833, 3),
        (-31.4, 190.827931833, 3),
        (396.4, 94, 3),
        (396.4, 39, 3),
        (-31.4, 39, 3),
        (-31.4, 94, 3),
    ]]
    chamfer(chanfro1_edges, length=CHANFRO1_SIZE)

    # Esboço10 → Corte-extrusão6 (cut, through all)
    with BuildSketch(Plane.XY.offset(6)):
        with Locations((385.342976088, 207.820691694)):
            Circle(ESBO_O10_R)
        with Locations((385.3, 83.913025663)):
            Circle(ESBO_O10_R_2)
        with Locations((385.3, 49.913025663)):
            Circle(ESBO_O10_R_3)
        with Locations(Location((-20.3, 49.913025663, 0), (0, 0, 180))):
            Circle(ESBO_O10_R_3)
        with Locations(Location((-20.3, 83.913025663, 0), (0, 0, 180))):
            Circle(ESBO_O10_R_2)
        with Locations(Location((-20.342976088, 207.820691694, 0), (0, 0, 180))):
            Circle(ESBO_O10_R)
    extrude(amount=-CORTE_EXTRUS_O6_DEPTH, mode=Mode.SUBTRACT)

    # Filete4
    filete4_edges = [part.edges().sort_by_distance(p)[0] for p in [
        (365, 0, 3),
        (0, 0, 3),
    ]]
    fillet(filete4_edges, radius=FILETE4_R)

    # Esboço11 → Corte-extrusão7 (cut, through all)
    with BuildSketch(Plane.XY.offset(6)):
        with Locations((201.086305027, 2.170538226)):
            Rectangle(ESBO_O11_W, ESBO_O11_H)
    extrude(amount=-CORTE_EXTRUS_O7_DEPTH, mode=Mode.SUBTRACT)

    # Filete5
    filete5_edges = [part.edges().sort_by_distance(p)[0] for p in [
        (0, 9, 3),
        (122.550125629, 9, 3),
        (92.449874371, 9, 3),
        (242.449874371, 9, 3),
        (272.550125629, 9, 3),
        (365, 9, 3),
    ]]
    fillet(filete5_edges, radius=FILETE5_R)


solid = part.part
